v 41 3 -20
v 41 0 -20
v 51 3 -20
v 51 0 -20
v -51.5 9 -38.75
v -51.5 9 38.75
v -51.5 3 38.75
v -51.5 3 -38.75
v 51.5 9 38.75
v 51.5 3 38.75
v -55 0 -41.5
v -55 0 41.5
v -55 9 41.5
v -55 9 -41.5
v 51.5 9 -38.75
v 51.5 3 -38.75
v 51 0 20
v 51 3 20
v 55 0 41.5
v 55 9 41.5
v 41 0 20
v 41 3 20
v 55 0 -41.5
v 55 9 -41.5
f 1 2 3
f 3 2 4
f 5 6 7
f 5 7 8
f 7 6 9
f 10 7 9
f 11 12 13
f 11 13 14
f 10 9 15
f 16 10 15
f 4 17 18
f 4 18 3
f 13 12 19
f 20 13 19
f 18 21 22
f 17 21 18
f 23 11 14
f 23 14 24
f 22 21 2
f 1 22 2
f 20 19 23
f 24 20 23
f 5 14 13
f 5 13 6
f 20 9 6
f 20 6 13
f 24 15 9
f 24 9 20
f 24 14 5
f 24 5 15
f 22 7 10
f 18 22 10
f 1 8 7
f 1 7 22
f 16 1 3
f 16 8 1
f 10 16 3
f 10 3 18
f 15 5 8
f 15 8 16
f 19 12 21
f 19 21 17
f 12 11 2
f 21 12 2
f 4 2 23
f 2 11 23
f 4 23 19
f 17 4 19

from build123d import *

# Parameters (mm, degrees)
SKETCH2_W           = 110
SKETCH2_H           = 83
SKETCH2_W_2         = 10
SKETCH2_H_2         = 40
BOSS_EXTRUDE1_DEPTH = 9
SKETCH4_W           = 103
SKETCH4_H           = 77.5
CUT_EXTRUDE1_DEPTH  = 6


with BuildPart() as part:
    # Sketch2 → Boss-Extrude1 (new body)
    with BuildSketch(Plane(origin=(0, 0, 0), x_dir=(1, 0, 0), z_dir=(0, 1, 0))):
        Rectangle(SKETCH2_W, SKETCH2_H)
        with Locations((46, 0)):
            Rectangle(SKETCH2_W_2, SKETCH2_H_2, mode=Mode.SUBTRACT)
    extrude(amount=BOSS_EXTRUDE1_DEPTH)

    # Sketch4 → Cut-Extrude1 (cut)
    with BuildSketch(Plane(origin=(0, 9, 0), x_dir=(1, 0, 0), z_dir=(0, 1, 0))):
        Rectangle(SKETCH4_W, SKETCH4_H)
    extrude(amount=-CUT_EXTRUDE1_DEPTH, mode=Mode.SUBTRACT)


solid = part.part
